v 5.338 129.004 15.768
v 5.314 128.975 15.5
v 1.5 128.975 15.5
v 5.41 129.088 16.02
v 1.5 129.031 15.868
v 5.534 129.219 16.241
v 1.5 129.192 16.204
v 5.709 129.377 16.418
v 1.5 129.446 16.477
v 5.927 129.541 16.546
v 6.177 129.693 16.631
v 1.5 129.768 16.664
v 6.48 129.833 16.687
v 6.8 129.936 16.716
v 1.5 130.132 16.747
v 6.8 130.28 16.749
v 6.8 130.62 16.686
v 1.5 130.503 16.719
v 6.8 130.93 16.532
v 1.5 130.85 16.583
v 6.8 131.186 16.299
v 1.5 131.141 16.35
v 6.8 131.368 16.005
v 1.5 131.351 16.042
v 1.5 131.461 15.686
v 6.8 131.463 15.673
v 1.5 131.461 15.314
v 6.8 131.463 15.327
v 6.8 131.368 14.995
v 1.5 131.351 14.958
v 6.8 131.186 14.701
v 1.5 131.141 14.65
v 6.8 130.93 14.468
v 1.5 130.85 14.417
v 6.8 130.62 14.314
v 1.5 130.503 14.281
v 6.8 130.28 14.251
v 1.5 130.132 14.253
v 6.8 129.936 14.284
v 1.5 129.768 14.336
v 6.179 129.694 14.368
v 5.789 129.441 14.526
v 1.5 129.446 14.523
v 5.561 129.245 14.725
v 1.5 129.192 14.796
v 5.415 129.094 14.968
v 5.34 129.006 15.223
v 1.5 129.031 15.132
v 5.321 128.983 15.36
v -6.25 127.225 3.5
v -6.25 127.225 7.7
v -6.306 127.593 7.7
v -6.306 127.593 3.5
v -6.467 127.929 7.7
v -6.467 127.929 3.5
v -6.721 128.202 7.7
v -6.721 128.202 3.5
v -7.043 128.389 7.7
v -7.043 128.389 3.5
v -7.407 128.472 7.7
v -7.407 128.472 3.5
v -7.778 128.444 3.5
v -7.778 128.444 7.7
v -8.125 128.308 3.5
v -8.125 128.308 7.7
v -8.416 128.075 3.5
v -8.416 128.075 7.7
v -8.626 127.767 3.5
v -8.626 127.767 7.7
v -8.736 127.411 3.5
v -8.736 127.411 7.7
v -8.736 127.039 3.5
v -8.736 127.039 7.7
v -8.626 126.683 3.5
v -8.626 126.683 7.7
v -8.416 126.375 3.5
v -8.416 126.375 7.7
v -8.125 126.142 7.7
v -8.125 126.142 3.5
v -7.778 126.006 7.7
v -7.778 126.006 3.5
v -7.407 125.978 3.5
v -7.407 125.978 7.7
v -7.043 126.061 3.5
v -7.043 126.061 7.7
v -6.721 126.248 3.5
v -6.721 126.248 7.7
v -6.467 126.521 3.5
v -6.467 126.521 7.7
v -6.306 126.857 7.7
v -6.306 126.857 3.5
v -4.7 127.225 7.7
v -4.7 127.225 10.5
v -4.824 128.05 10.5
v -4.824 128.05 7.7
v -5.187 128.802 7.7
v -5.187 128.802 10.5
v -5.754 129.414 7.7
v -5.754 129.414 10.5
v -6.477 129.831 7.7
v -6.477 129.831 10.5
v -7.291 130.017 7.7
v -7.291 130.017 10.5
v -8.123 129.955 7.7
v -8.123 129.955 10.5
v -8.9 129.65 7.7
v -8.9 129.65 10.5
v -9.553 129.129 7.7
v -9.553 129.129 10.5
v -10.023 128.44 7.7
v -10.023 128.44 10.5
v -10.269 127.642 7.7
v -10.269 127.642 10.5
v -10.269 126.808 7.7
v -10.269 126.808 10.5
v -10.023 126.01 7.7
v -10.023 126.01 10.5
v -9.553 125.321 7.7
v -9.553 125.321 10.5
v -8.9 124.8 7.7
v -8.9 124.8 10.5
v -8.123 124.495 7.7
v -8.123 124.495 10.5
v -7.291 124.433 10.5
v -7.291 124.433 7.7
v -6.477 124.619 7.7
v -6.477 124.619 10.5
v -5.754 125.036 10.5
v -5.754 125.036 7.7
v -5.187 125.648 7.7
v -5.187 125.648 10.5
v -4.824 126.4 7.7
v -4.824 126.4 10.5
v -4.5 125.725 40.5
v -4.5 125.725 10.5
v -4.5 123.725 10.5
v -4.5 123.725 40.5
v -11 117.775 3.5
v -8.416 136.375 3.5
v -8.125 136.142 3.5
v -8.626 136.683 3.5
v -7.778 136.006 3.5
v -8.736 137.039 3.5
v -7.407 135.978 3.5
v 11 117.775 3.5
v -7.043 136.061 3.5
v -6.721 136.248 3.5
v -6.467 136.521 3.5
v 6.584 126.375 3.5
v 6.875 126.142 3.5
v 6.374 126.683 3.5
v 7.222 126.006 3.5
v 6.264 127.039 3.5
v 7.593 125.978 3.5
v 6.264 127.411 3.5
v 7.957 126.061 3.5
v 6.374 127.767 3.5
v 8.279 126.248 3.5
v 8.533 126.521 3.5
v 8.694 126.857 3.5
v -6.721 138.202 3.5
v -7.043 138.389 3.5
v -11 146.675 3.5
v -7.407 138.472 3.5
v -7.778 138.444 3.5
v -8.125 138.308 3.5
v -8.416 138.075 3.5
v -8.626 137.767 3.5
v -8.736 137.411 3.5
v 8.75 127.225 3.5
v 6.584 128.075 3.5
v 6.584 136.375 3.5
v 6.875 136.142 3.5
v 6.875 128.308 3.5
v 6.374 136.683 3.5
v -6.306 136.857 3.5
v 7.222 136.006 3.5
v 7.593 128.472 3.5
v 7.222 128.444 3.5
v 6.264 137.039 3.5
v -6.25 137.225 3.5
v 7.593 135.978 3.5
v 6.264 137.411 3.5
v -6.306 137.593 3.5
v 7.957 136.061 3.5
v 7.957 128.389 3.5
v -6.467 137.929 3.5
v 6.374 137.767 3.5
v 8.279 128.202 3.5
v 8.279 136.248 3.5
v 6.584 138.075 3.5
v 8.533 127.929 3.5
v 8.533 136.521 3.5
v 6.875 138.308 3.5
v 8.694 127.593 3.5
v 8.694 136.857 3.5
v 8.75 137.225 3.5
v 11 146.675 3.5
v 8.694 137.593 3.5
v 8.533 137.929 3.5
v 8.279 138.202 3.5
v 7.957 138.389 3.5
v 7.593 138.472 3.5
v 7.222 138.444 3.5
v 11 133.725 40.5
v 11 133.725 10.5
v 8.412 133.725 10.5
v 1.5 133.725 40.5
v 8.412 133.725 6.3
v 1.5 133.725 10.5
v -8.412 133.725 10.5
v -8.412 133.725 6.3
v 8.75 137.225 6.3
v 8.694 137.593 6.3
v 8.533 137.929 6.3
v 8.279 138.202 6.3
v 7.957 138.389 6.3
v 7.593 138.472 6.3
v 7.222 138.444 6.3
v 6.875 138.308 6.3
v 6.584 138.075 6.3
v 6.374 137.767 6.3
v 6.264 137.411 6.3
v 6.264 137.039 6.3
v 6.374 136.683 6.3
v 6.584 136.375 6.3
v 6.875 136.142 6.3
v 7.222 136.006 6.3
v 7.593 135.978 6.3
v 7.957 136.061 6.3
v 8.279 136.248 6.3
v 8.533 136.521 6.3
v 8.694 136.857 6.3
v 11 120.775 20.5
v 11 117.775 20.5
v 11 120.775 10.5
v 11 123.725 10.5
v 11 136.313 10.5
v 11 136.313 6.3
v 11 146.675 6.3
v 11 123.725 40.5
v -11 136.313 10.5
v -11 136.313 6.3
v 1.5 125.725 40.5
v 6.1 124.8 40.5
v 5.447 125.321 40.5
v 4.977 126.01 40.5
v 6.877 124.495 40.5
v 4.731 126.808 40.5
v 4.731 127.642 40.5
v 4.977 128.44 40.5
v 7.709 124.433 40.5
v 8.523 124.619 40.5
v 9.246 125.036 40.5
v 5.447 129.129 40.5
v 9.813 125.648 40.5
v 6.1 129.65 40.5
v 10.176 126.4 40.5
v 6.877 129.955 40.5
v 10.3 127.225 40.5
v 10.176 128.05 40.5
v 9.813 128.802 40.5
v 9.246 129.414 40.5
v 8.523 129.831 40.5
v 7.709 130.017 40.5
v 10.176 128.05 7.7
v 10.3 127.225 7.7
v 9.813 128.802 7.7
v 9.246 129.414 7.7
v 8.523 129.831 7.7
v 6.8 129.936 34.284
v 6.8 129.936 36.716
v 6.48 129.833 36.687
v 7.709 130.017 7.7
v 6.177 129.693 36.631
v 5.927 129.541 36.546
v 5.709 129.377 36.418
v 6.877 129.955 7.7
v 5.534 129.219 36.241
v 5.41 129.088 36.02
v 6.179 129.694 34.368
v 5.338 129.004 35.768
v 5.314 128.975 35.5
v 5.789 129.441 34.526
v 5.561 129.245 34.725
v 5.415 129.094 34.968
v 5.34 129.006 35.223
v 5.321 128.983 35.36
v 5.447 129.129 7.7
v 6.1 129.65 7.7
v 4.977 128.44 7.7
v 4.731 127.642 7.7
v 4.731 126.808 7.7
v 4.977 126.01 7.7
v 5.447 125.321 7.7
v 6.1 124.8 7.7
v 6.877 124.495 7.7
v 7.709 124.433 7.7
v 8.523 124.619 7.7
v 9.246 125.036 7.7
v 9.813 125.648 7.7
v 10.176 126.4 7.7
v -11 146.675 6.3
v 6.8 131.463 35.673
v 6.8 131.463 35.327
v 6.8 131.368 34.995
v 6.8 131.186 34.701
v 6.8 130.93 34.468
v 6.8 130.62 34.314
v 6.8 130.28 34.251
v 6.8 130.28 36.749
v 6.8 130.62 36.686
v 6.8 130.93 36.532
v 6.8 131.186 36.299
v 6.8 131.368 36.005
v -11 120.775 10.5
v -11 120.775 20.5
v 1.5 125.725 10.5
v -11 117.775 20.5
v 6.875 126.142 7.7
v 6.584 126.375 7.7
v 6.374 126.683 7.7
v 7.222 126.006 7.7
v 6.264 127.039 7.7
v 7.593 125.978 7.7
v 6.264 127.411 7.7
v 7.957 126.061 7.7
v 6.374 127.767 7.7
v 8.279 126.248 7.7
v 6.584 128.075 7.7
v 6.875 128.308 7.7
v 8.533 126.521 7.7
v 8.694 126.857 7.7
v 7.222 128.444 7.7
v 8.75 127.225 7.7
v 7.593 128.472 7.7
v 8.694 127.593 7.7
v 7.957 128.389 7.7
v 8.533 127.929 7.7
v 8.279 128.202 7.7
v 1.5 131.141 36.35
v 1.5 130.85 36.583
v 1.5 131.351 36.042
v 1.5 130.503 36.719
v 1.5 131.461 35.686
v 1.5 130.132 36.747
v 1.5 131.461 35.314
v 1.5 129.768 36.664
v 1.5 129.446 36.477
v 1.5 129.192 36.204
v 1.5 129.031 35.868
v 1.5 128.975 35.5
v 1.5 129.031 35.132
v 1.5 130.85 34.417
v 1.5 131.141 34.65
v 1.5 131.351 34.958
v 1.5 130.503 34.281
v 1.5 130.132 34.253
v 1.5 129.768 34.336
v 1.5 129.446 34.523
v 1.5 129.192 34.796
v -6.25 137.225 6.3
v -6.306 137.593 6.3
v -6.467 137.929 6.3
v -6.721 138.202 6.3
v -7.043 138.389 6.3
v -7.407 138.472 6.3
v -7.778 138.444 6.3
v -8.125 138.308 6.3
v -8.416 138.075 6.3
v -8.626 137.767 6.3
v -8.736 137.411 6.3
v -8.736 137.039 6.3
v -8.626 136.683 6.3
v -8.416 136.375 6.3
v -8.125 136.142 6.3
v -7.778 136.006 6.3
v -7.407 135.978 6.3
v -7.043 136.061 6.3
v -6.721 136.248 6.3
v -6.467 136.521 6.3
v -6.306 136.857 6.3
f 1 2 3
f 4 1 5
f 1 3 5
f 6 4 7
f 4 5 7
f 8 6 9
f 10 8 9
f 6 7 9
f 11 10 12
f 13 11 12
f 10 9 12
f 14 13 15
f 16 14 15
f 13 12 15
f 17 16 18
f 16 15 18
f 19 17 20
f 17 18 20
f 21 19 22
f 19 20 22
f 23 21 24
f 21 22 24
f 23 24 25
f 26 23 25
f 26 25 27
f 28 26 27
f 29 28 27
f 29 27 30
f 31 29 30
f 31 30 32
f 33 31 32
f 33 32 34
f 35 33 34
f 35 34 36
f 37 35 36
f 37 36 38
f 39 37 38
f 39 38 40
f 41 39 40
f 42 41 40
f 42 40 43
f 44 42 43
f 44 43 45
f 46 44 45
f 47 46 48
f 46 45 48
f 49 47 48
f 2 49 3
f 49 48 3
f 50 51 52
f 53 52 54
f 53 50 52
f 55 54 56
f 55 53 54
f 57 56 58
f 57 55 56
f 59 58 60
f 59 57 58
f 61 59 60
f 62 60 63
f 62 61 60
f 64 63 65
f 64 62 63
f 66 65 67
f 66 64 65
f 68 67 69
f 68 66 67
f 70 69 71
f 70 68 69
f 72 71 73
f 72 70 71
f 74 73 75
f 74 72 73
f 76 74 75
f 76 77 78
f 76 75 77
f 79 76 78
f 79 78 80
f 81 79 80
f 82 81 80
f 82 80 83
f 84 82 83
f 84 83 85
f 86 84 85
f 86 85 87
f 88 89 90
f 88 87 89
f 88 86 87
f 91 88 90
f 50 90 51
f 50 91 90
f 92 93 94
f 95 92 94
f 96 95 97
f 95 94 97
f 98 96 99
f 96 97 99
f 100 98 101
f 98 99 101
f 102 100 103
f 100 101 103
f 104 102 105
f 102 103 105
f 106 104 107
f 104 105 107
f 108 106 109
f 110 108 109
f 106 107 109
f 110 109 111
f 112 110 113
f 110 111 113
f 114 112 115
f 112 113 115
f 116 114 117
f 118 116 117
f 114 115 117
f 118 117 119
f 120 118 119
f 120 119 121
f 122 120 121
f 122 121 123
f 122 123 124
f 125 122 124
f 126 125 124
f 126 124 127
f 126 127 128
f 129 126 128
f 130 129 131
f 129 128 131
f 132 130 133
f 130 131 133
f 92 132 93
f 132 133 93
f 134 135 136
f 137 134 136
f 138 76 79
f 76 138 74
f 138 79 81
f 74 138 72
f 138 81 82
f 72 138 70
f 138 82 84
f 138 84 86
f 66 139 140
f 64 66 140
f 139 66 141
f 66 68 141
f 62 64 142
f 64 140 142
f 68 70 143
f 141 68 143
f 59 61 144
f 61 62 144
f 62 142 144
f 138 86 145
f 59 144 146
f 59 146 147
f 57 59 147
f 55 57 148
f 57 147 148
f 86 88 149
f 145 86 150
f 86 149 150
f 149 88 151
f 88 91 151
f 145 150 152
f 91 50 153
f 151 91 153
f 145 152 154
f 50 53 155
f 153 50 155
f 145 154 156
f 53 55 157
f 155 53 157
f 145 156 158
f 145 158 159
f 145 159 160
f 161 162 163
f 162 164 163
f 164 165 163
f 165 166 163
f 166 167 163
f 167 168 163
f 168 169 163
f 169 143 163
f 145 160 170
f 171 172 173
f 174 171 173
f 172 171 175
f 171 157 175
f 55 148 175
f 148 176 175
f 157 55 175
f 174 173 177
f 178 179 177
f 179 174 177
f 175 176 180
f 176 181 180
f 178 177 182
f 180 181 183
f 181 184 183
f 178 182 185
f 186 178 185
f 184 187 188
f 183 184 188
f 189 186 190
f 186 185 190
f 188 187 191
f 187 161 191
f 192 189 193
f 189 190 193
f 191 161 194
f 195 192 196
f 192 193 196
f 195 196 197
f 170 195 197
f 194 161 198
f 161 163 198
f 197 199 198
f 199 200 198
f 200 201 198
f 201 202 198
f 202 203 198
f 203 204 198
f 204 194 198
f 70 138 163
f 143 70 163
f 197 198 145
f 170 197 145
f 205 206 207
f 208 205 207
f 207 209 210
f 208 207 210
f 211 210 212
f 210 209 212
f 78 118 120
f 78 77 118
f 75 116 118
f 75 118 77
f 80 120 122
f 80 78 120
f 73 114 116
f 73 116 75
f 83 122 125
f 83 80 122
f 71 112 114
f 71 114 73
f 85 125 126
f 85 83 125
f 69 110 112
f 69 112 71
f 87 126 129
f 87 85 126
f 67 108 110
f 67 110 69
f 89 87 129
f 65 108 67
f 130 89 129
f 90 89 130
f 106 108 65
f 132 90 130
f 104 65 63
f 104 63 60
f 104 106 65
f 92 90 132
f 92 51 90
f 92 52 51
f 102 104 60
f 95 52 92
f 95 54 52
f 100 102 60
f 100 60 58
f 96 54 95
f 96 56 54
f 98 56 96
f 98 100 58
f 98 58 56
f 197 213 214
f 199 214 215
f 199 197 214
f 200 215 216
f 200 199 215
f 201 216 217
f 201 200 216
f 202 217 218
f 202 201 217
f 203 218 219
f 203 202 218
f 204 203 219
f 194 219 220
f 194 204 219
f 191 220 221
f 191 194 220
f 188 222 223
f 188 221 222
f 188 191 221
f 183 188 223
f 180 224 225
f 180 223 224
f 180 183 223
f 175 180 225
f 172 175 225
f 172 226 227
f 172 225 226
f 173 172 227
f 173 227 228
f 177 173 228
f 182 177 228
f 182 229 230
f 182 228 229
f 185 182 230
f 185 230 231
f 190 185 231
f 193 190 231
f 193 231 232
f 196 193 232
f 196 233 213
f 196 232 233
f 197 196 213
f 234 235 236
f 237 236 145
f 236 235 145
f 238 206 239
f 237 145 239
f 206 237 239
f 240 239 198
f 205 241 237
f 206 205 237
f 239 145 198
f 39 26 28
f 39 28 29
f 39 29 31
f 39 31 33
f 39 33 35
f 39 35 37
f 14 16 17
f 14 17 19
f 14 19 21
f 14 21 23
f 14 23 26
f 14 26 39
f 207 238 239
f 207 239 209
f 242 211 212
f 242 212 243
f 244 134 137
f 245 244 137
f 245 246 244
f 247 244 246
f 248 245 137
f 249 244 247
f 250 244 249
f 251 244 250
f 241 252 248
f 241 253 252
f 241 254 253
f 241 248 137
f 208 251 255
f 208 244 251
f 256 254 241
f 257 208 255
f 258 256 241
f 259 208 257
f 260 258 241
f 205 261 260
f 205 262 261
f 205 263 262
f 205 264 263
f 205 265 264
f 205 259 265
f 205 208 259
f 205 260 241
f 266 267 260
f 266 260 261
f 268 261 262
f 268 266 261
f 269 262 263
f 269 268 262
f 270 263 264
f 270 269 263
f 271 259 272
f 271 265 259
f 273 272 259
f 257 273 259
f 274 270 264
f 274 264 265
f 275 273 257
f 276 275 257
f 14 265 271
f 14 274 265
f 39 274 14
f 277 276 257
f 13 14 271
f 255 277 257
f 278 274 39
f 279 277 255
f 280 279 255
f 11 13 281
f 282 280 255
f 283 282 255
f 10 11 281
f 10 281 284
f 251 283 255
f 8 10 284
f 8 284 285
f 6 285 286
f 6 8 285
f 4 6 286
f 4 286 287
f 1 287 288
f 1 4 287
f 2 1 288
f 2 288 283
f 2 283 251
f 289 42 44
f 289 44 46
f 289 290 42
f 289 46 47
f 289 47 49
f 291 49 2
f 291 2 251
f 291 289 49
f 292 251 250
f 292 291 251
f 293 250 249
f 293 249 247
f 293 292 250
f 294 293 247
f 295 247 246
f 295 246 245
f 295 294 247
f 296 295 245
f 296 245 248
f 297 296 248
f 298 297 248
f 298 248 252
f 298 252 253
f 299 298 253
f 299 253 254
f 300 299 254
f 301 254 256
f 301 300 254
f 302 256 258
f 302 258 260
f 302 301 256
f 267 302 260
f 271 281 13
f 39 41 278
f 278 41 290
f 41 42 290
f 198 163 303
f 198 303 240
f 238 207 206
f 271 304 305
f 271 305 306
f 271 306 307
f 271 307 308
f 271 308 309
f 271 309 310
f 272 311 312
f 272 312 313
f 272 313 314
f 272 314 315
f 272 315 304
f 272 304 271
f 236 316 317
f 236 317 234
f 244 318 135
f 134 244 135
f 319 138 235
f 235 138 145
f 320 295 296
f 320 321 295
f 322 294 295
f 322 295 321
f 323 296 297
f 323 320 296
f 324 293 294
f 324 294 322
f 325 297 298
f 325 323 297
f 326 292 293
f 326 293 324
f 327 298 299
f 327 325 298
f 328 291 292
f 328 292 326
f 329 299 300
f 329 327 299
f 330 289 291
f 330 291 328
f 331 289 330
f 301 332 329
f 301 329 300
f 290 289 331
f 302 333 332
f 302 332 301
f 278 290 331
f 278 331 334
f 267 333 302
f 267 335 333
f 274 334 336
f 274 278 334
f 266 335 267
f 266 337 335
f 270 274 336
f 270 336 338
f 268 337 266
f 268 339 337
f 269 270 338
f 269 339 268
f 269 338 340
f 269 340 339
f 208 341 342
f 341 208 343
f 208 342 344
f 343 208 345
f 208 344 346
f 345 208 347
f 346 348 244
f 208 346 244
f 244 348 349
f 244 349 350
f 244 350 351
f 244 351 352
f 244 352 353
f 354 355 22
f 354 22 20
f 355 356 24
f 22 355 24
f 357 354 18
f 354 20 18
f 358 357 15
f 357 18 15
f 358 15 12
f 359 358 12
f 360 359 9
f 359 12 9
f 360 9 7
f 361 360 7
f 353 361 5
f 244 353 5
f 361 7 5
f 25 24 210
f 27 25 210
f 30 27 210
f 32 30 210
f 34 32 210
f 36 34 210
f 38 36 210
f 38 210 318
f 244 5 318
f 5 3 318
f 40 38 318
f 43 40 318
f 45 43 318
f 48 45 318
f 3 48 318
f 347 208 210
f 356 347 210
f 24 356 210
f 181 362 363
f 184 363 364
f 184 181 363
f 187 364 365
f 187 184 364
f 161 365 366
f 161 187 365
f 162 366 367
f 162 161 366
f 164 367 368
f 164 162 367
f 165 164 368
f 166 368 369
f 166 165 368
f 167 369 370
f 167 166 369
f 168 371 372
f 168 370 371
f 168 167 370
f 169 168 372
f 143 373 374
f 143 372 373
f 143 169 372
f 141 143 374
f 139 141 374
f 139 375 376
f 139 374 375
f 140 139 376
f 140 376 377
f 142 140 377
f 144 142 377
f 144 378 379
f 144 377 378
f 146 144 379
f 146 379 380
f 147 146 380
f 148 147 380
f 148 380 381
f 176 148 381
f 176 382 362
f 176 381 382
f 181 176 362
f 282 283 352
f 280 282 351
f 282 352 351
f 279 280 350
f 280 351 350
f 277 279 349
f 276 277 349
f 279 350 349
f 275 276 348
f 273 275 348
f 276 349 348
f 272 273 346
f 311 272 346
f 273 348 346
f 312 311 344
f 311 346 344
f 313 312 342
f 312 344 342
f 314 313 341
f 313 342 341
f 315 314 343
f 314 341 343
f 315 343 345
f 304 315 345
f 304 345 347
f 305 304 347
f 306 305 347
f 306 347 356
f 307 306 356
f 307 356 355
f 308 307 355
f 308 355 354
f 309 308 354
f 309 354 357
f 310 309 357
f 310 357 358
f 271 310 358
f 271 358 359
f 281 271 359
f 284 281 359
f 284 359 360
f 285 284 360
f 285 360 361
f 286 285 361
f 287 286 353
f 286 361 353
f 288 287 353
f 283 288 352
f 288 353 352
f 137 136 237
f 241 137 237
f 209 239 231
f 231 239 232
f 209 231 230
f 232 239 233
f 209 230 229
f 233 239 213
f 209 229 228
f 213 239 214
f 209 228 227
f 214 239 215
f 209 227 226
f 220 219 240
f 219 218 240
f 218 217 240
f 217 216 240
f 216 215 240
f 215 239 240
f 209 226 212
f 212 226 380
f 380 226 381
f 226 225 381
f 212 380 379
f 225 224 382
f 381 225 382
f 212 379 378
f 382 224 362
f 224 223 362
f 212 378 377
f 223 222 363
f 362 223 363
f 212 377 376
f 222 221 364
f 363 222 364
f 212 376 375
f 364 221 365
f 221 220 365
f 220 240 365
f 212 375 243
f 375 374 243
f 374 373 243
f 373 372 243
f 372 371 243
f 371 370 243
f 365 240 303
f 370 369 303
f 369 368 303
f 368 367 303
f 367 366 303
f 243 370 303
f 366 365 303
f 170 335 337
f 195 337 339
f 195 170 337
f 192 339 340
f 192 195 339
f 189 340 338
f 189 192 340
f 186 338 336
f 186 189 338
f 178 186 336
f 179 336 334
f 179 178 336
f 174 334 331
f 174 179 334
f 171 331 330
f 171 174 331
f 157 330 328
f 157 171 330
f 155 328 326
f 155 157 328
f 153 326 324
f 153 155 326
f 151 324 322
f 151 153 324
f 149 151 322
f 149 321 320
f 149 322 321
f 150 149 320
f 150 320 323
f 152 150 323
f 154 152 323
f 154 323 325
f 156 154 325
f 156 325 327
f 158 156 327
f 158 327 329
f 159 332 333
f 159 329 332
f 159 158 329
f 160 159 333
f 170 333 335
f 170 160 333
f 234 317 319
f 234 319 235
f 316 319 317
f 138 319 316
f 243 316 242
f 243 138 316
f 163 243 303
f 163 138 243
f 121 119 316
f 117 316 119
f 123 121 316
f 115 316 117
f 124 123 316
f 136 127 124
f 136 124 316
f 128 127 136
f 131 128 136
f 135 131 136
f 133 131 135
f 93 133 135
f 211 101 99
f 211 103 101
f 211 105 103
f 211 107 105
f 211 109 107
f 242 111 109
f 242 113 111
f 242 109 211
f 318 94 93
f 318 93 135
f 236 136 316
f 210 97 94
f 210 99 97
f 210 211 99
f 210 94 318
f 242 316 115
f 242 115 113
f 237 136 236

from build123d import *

# Parameters (mm, degrees)
SKETCH016_W     = 22
SKETCH016_H     = 28.9
SKETCH016_R     = 1.25
PAD010_DEPTH    = 7
POCKET005_DEPTH = 4.2
SKETCH020_R     = 2.8
POCKET006_DEPTH = 2.8
SKETCH021_R     = 2.8
PAD011_DEPTH    = 30
SKETCH022_R     = 1.25
POCKET007_DEPTH = 5.3
SKETCH026_W     = 22
SKETCH026_H     = 3
PAD015_DEPTH    = 10


with BuildPart() as part:
    # Sketch016 (on Face1 of ReferencePad007) → Pad010 (new body)
    with BuildSketch(Plane.XY.offset(3.5)):
        with Locations((0, 132.225)):
            Rectangle(SKETCH016_W, SKETCH016_H)
        with Locations((-7.5, 137.225)):
            Circle(SKETCH016_R, mode=Mode.SUBTRACT)
        with Locations((-7.5, 127.225)):
            Circle(SKETCH016_R, mode=Mode.SUBTRACT)
        with Locations((7.5, 137.225)):
            Circle(SKETCH016_R, mode=Mode.SUBTRACT)
        with Locations((7.5, 127.225)):
            Circle(SKETCH016_R, mode=Mode.SUBTRACT)
    extrude(amount=PAD010_DEPTH)

    # Sketch019 (on Face10 of Pad010) → Pocket005 (cut)
    with BuildSketch(Plane.XY.offset(10.5)):
        Polygon((-8.411624, 133.725), (-11, 136.313376), (-11, 146.675), (11, 146.675), (11, 136.313376), (8.411624, 133.725), align=None)
    extrude(amount=-POCKET005_DEPTH, mode=Mode.SUBTRACT)

    # Sketch020 (on Face5 of Pocket005) → Pocket006 (cut)
    with BuildSketch(Plane.XY.offset(10.5)):
        with Locations((-7.5, 127.225)):
            Circle(SKETCH020_R)
        with Locations((7.5, 127.225)):
            Circle(SKETCH020_R)
    extrude(amount=-POCKET006_DEPTH, mode=Mode.SUBTRACT)

    # Sketch021 (on Face5 of Pocket006) → Pad011 (join)
    with BuildSketch(Plane.XY.offset(10.5)):
        Polygon((-4.5, 123.725), (11, 123.725), (11, 133.725), (1.5, 133.725), (1.5, 125.725), (-4.5, 125.725), align=None)
        with Locations((7.5, 127.225)):
            Circle(SKETCH021_R, mode=Mode.SUBTRACT)
    extrude(amount=PAD011_DEPTH)

    # Sketch022 (on Face17 of Pad011) → Pocket007 (cut)
    with BuildSketch(Plane(origin=(1.5, 0, 8), x_dir=(0, -1, 0), z_dir=(-1, 0, 0))):
        with Locations((-130.225, 27.5)):
            Circle(SKETCH022_R)
        with Locations((-130.225, 7.5)):
            Circle(SKETCH022_R)
    extrude(amount=-POCKET007_DEPTH, mode=Mode.SUBTRACT)

    # Sketch026 (on Face5 of Pocket007) → Pad015 (join)
    with BuildSketch(Plane.XY.offset(10.5)):
        with Locations((0, 119.275)):
            Rectangle(SKETCH026_W, SKETCH026_H)
    extrude(amount=PAD015_DEPTH)


solid = part.part
